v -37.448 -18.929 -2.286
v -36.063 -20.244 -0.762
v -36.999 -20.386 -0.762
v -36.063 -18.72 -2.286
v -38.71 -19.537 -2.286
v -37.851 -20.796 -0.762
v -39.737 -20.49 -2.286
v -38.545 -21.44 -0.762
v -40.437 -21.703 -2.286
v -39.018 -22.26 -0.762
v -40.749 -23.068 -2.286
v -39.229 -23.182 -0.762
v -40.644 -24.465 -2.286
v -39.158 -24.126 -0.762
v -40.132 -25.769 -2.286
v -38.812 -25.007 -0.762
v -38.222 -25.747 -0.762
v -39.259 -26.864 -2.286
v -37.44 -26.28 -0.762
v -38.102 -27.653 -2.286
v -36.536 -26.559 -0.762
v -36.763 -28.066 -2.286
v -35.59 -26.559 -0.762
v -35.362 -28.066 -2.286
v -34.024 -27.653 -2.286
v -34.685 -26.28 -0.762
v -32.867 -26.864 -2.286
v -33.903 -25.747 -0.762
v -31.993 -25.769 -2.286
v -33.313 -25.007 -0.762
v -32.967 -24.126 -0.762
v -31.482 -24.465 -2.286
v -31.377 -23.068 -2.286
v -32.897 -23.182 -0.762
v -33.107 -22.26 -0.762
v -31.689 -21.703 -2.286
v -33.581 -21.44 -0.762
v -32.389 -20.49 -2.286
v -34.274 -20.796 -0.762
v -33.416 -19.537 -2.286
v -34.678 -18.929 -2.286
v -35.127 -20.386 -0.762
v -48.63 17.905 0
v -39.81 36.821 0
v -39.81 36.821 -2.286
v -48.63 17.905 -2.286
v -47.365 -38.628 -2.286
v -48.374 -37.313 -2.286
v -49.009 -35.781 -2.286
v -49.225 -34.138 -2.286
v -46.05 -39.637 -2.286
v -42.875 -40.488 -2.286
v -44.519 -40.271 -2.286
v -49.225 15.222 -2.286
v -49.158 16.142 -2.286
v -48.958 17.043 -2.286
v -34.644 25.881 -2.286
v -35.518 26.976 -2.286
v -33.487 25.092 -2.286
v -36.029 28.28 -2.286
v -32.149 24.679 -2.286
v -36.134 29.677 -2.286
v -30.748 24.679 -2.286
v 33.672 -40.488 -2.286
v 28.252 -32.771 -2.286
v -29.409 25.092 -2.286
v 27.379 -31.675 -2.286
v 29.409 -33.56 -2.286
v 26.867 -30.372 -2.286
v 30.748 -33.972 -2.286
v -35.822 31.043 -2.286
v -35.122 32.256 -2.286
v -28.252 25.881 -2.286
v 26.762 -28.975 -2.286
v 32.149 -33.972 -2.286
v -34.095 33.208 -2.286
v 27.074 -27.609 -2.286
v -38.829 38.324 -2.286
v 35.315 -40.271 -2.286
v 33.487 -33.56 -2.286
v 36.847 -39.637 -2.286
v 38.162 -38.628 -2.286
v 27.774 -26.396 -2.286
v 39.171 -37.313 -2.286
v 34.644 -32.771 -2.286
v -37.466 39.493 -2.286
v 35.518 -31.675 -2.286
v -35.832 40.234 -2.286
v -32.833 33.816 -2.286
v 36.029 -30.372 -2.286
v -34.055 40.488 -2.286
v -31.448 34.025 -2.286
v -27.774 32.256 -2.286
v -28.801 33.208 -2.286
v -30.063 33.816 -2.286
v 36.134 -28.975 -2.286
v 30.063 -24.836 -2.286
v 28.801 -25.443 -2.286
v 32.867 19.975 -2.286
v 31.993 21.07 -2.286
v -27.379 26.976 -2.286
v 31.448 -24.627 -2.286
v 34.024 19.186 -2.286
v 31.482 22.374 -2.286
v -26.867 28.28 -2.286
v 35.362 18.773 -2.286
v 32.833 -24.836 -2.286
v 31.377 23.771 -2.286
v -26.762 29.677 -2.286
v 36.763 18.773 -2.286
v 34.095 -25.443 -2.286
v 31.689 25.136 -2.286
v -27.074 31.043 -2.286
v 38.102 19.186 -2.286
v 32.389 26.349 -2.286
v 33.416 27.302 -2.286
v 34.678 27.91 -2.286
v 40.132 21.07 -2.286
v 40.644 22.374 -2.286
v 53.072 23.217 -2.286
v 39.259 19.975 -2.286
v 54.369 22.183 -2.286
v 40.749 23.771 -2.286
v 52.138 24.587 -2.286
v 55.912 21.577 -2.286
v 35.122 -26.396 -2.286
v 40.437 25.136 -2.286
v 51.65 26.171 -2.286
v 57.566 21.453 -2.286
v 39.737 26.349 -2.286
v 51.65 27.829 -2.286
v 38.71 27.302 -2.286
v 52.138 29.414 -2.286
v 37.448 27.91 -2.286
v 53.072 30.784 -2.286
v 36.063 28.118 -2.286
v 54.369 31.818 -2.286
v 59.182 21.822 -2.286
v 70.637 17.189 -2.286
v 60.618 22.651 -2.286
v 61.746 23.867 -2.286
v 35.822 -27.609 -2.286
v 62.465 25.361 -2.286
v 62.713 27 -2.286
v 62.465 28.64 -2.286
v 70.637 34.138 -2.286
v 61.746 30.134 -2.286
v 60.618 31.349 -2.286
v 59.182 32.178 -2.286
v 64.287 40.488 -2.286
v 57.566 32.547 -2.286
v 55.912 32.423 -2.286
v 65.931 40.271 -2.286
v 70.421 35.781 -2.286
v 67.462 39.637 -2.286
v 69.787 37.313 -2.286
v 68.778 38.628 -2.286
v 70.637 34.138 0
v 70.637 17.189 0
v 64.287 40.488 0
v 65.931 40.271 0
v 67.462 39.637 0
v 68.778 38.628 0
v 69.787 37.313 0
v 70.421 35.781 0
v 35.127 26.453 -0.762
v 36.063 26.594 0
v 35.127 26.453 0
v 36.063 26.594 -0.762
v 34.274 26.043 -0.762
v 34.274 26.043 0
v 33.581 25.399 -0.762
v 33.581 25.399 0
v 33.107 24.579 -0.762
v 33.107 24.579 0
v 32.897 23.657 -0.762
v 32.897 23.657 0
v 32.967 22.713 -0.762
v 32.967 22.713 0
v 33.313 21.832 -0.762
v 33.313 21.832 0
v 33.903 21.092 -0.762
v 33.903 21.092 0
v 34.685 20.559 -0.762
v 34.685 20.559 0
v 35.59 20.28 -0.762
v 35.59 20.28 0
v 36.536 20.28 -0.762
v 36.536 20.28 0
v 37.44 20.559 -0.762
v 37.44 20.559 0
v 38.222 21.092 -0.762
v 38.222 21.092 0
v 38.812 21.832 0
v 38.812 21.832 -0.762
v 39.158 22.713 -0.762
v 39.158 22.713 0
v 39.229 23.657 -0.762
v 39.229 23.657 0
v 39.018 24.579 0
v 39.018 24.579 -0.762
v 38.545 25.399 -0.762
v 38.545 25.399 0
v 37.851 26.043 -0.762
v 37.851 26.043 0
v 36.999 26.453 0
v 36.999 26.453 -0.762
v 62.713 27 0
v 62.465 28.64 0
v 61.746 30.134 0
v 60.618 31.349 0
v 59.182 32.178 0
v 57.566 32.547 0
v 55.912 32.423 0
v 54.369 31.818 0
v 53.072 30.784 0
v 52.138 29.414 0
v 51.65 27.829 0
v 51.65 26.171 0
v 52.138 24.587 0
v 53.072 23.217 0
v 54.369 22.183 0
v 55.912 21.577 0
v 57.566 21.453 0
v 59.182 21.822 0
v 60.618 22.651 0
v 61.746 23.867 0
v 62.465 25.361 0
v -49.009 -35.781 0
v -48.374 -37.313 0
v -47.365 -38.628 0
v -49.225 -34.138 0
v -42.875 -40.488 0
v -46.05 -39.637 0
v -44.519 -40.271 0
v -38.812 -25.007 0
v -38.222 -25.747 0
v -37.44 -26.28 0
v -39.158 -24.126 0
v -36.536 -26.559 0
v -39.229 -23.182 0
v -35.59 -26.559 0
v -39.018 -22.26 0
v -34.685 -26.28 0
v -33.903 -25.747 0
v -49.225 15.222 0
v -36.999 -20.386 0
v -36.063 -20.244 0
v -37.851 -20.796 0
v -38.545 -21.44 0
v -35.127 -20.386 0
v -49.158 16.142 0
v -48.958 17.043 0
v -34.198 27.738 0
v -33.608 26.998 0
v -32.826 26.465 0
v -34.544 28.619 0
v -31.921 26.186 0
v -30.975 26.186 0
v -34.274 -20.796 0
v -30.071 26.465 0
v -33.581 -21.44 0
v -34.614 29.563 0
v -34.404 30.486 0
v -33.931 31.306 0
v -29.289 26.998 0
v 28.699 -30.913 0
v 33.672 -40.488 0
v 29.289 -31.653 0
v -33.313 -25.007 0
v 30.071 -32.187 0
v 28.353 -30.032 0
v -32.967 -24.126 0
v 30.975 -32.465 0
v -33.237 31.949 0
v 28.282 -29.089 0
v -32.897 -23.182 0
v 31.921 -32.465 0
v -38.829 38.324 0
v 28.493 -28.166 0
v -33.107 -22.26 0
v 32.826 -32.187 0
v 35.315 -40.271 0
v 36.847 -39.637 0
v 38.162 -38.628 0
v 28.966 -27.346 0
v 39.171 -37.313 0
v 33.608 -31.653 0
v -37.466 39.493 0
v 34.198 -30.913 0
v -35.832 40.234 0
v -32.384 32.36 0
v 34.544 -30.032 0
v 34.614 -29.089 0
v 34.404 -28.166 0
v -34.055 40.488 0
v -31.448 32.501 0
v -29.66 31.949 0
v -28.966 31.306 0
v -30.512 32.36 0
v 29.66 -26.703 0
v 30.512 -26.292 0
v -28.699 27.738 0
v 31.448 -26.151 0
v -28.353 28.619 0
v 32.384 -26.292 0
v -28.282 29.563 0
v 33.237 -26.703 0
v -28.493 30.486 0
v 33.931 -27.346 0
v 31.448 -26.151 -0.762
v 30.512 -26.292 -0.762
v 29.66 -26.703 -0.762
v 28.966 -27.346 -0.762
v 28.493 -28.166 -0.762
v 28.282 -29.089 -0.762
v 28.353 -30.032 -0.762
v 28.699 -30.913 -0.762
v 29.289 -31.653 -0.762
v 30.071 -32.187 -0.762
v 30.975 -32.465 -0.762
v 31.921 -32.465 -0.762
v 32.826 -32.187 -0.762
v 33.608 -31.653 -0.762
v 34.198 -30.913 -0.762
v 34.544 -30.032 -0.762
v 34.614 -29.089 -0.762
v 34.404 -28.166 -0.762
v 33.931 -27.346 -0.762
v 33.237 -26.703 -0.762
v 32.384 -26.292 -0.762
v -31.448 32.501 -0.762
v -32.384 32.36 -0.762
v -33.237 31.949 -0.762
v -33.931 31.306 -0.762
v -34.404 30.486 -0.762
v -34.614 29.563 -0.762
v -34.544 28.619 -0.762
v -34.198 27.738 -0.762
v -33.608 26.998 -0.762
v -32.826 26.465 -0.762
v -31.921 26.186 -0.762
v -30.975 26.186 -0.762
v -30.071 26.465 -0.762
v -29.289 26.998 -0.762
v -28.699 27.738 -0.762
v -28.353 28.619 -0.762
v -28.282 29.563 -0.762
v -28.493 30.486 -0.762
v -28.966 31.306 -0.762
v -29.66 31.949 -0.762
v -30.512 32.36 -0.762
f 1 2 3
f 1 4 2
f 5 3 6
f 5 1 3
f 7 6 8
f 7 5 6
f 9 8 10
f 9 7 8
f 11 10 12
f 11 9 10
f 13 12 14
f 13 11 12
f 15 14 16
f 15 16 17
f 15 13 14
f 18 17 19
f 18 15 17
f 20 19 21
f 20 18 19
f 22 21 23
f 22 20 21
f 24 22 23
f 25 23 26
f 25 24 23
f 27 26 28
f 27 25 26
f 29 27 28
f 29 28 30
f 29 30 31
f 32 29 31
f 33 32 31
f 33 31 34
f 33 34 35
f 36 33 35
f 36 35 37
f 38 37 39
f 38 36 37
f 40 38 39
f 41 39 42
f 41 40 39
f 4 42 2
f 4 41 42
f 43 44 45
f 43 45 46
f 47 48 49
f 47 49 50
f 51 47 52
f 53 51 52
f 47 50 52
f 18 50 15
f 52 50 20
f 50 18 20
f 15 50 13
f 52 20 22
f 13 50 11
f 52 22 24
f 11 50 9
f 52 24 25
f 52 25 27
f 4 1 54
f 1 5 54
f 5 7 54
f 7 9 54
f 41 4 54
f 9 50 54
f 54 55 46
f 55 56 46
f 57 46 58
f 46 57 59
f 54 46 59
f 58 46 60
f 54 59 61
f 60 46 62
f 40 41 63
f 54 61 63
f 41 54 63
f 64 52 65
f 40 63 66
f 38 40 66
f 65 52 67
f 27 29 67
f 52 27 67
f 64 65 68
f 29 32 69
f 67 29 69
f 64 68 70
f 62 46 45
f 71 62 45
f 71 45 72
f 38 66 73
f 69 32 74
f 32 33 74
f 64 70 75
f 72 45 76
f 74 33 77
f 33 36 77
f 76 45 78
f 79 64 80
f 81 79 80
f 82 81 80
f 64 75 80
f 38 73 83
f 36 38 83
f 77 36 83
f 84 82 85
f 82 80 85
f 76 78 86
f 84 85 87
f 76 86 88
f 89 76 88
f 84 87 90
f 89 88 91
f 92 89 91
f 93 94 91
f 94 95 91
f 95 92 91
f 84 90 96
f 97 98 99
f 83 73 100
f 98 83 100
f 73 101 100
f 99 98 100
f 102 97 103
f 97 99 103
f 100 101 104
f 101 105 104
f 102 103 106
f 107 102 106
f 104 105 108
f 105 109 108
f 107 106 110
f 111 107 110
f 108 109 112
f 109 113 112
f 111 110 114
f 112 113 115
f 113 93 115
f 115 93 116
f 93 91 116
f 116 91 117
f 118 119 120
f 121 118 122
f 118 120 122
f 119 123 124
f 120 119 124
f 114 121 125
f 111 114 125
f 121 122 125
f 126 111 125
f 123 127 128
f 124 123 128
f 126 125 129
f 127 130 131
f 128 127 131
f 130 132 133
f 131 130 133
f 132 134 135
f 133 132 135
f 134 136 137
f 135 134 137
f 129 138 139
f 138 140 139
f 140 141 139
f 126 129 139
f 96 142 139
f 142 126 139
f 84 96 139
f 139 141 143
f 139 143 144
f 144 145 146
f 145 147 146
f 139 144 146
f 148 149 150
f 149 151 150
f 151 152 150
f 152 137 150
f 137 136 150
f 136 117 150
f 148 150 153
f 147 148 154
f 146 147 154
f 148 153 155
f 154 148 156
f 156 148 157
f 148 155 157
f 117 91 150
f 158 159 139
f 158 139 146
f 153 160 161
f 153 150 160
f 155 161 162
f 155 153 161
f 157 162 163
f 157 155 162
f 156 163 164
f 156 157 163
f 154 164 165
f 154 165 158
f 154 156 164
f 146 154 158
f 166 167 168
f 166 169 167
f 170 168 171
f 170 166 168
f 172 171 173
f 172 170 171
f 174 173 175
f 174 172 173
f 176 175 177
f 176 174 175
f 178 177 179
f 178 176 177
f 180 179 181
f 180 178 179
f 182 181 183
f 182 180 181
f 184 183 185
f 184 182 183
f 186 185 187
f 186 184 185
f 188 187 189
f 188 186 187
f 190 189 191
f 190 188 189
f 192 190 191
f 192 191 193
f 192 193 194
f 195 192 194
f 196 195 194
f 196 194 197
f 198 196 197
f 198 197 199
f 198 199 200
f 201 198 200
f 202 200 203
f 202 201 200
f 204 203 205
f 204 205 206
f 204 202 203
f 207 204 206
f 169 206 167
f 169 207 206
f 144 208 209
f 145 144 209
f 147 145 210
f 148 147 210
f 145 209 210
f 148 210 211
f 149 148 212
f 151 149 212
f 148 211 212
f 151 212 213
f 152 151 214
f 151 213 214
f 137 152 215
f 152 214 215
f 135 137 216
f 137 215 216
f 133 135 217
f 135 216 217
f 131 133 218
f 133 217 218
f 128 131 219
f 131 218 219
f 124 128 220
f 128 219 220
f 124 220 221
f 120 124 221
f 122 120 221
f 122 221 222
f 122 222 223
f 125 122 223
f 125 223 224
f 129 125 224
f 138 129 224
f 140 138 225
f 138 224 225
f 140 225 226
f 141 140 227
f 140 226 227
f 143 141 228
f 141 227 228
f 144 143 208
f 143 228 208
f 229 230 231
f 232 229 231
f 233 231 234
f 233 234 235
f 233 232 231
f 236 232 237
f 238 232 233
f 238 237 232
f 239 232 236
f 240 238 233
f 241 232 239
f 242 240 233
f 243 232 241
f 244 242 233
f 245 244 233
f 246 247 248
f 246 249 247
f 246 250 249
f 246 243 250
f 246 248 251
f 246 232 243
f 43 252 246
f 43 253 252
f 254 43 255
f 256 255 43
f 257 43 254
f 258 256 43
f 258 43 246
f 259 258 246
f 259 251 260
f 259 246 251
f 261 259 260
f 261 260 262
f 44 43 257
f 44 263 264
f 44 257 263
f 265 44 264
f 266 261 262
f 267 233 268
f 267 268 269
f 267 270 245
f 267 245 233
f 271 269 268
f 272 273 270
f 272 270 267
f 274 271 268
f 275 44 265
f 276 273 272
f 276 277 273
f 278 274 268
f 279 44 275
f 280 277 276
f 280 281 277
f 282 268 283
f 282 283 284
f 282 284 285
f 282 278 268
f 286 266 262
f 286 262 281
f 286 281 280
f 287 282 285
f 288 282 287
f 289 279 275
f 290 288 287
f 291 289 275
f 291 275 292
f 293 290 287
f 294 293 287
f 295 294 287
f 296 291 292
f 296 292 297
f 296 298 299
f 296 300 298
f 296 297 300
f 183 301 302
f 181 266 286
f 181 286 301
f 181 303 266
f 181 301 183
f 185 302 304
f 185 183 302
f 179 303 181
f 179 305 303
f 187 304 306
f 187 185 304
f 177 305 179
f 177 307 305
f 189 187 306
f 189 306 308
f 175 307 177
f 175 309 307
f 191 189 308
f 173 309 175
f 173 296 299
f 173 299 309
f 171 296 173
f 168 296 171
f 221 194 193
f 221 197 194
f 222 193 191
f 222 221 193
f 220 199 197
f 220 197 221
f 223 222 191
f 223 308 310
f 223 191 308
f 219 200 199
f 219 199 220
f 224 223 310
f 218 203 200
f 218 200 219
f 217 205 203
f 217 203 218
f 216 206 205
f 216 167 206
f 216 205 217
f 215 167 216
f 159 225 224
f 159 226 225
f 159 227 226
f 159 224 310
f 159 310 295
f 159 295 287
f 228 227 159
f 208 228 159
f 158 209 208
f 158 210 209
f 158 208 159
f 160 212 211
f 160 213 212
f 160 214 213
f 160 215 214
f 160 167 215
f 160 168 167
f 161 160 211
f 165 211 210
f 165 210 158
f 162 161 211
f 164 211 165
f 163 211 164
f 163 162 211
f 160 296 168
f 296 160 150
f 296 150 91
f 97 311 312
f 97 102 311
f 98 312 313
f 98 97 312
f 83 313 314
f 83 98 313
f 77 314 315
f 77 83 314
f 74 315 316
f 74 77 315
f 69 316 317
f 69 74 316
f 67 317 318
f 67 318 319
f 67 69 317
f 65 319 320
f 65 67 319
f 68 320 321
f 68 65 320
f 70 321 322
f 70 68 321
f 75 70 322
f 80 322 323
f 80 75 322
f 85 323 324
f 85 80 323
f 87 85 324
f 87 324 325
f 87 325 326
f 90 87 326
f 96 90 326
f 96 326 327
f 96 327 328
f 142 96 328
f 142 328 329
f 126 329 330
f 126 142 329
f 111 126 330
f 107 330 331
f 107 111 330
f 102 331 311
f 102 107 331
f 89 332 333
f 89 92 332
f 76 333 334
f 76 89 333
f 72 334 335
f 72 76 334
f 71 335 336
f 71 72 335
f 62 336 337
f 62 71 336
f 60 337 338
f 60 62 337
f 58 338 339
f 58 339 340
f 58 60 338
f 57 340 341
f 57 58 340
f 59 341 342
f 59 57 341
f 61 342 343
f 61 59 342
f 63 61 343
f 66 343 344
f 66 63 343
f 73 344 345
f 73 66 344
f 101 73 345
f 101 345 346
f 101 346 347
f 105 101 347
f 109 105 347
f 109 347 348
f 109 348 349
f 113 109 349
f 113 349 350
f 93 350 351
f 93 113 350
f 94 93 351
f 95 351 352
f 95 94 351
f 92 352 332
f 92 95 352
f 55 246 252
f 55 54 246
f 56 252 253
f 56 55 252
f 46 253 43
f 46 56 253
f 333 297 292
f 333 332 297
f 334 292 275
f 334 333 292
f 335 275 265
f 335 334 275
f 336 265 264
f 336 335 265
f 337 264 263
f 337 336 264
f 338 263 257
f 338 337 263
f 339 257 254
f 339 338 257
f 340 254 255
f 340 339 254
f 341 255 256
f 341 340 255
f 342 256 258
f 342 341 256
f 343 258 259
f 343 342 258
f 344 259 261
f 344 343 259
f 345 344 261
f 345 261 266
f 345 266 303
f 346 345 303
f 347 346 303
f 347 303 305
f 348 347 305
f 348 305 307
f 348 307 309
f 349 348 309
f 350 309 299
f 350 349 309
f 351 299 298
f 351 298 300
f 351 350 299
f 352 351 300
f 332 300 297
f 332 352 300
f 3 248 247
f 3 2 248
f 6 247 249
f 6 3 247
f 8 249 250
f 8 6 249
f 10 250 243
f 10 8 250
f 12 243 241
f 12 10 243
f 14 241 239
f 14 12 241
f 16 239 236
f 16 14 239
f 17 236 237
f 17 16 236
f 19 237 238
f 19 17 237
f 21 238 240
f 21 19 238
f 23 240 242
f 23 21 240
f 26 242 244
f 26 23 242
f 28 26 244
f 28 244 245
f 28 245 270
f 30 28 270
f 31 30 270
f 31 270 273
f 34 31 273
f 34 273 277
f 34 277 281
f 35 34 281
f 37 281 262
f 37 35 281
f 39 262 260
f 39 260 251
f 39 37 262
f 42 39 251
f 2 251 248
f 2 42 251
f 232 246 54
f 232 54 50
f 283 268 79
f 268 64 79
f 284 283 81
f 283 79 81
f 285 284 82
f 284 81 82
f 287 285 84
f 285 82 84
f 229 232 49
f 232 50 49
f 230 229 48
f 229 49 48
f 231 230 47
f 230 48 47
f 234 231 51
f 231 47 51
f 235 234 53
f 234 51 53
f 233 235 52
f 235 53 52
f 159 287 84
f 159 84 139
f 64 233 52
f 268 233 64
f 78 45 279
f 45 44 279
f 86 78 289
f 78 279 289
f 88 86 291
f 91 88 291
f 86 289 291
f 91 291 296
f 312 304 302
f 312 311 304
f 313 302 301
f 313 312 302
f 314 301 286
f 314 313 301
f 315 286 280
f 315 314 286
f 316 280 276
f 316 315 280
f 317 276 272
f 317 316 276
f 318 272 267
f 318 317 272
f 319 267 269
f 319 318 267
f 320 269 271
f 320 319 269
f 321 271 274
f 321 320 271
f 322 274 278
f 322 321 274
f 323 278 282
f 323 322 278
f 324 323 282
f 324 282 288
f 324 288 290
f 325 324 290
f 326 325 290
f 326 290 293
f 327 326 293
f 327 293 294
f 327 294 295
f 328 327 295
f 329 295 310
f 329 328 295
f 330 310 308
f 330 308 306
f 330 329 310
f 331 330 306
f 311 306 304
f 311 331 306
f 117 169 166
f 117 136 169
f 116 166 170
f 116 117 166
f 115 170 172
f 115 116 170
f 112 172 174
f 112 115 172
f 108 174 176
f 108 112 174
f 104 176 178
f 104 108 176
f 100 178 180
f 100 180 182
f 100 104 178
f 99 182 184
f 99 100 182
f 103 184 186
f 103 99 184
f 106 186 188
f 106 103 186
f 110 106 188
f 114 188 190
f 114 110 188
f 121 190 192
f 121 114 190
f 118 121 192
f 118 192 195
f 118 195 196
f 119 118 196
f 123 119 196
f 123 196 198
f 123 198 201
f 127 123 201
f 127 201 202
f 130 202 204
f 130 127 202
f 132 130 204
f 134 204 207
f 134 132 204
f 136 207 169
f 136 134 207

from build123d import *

# Parameters (mm, degrees)
SKETCH11_R                        = 5.5626
BASE_FLANGE1_DEPTH                = 2.286
CSK_FOR_M4_FH_MODIFIED_AT_2_COUNT = 2
CSK_FOR_M4_FH_MODIFIED_AT_2_PITCH = 67.76892481
CSK_FOR_M4_FH_MODIFIED_AT_3_COUNT = 2
CSK_FOR_M4_FH_MODIFIED_AT_3_PITCH = 86
CSK_FOR_M4_FH_MODIFIED_AT_4_COUNT = 2
CSK_FOR_M4_FH_MODIFIED_AT_4_PITCH = 52.946886878
CUT_EXTRUDE1_DEPTH                = 82.450069543
FILLET1_R                         = 6.35


# Sheet-metal steps are written as plain solids
with BuildPart() as part:
    # Sketch11 → Base-Flange1 (new body)
    with BuildSketch(Plane.XY):
        Polygon((-49.2252, 40.4876), (-49.2252, -40.4876), (37.337994573, -40.4876), (70.6374, 17.188662062), (70.6374, 40.4876), align=None)
        with Locations((57.15, 27.0002)):
            Circle(SKETCH11_R, mode=Mode.SUBTRACT)
    extrude(amount=-BASE_FLANGE1_DEPTH)

    # Sketch15 → CSK for M4 FH Modified (revolve, cut)
    with BuildSketch(Plane(origin=(36.062834422, 23.419478506, -2.286), x_dir=(0, 1, 0), z_dir=(1, 0, 0))):
        Polygon((0, 0), (0, 2.286), (3.175, 2.286), (3.175, 1.524), (4.699, 0), align=None)
    csk_for_m4_fh_modified = revolve(axis=Axis((36.062834422, 23.419478506, -8.636), (0, 0, 1)), mode=Mode.SUBTRACT)

    # CSK for M4 FH Modified at 2: CSK for M4 FH Modified ×2
    with Locations(*[Vector(-0.9961946980917455, 0.08715574274765803, 0) * (i * CSK_FOR_M4_FH_MODIFIED_AT_2_PITCH) for i in range(1, CSK_FOR_M4_FH_MODIFIED_AT_2_COUNT)]):
        add(csk_for_m4_fh_modified, mode=Mode.SUBTRACT)

    # CSK for M4 FH Modified at 3: CSK for M4 FH Modified ×2
    with Locations(*[Vector(-0.838670567945423, -0.5446390350150286, 0) * (i * CSK_FOR_M4_FH_MODIFIED_AT_3_PITCH) for i in range(1, CSK_FOR_M4_FH_MODIFIED_AT_3_COUNT)]):
        add(csk_for_m4_fh_modified, mode=Mode.SUBTRACT)

    # CSK for M4 FH Modified at 4: CSK for M4 FH Modified ×2
    with Locations(*[Vector(-0.08715574274765796, -0.9961946980917455, 0) * (i * CSK_FOR_M4_FH_MODIFIED_AT_4_PITCH) for i in range(1, CSK_FOR_M4_FH_MODIFIED_AT_4_COUNT)]):
        add(csk_for_m4_fh_modified, mode=Mode.SUBTRACT)

    # Sketch17 → Cut-Extrude1 (cut, through all)
    with BuildSketch(Plane.XY):
        Polygon((-34.546735645, 48.1076), (-56.8452, 0.288388874), (-56.8452, 48.1076), align=None)
    extrude(amount=-CUT_EXTRUDE1_DEPTH, mode=Mode.SUBTRACT)

    # Fillet1
    fillet1_edges = [part.edges().sort_by_distance(p)[0] for p in [
        (-49.2252, 16.629531608, -1.143),
        (-38.1, 40.4876, -1.143),
        (37.337994573, -40.4876, -1.143),
        (-49.2252, -40.4876, -1.143),
        (70.6374, 40.4876, -1.143),
    ]]
    fillet(fillet1_edges, radius=FILLET1_R)


solid = part.part
